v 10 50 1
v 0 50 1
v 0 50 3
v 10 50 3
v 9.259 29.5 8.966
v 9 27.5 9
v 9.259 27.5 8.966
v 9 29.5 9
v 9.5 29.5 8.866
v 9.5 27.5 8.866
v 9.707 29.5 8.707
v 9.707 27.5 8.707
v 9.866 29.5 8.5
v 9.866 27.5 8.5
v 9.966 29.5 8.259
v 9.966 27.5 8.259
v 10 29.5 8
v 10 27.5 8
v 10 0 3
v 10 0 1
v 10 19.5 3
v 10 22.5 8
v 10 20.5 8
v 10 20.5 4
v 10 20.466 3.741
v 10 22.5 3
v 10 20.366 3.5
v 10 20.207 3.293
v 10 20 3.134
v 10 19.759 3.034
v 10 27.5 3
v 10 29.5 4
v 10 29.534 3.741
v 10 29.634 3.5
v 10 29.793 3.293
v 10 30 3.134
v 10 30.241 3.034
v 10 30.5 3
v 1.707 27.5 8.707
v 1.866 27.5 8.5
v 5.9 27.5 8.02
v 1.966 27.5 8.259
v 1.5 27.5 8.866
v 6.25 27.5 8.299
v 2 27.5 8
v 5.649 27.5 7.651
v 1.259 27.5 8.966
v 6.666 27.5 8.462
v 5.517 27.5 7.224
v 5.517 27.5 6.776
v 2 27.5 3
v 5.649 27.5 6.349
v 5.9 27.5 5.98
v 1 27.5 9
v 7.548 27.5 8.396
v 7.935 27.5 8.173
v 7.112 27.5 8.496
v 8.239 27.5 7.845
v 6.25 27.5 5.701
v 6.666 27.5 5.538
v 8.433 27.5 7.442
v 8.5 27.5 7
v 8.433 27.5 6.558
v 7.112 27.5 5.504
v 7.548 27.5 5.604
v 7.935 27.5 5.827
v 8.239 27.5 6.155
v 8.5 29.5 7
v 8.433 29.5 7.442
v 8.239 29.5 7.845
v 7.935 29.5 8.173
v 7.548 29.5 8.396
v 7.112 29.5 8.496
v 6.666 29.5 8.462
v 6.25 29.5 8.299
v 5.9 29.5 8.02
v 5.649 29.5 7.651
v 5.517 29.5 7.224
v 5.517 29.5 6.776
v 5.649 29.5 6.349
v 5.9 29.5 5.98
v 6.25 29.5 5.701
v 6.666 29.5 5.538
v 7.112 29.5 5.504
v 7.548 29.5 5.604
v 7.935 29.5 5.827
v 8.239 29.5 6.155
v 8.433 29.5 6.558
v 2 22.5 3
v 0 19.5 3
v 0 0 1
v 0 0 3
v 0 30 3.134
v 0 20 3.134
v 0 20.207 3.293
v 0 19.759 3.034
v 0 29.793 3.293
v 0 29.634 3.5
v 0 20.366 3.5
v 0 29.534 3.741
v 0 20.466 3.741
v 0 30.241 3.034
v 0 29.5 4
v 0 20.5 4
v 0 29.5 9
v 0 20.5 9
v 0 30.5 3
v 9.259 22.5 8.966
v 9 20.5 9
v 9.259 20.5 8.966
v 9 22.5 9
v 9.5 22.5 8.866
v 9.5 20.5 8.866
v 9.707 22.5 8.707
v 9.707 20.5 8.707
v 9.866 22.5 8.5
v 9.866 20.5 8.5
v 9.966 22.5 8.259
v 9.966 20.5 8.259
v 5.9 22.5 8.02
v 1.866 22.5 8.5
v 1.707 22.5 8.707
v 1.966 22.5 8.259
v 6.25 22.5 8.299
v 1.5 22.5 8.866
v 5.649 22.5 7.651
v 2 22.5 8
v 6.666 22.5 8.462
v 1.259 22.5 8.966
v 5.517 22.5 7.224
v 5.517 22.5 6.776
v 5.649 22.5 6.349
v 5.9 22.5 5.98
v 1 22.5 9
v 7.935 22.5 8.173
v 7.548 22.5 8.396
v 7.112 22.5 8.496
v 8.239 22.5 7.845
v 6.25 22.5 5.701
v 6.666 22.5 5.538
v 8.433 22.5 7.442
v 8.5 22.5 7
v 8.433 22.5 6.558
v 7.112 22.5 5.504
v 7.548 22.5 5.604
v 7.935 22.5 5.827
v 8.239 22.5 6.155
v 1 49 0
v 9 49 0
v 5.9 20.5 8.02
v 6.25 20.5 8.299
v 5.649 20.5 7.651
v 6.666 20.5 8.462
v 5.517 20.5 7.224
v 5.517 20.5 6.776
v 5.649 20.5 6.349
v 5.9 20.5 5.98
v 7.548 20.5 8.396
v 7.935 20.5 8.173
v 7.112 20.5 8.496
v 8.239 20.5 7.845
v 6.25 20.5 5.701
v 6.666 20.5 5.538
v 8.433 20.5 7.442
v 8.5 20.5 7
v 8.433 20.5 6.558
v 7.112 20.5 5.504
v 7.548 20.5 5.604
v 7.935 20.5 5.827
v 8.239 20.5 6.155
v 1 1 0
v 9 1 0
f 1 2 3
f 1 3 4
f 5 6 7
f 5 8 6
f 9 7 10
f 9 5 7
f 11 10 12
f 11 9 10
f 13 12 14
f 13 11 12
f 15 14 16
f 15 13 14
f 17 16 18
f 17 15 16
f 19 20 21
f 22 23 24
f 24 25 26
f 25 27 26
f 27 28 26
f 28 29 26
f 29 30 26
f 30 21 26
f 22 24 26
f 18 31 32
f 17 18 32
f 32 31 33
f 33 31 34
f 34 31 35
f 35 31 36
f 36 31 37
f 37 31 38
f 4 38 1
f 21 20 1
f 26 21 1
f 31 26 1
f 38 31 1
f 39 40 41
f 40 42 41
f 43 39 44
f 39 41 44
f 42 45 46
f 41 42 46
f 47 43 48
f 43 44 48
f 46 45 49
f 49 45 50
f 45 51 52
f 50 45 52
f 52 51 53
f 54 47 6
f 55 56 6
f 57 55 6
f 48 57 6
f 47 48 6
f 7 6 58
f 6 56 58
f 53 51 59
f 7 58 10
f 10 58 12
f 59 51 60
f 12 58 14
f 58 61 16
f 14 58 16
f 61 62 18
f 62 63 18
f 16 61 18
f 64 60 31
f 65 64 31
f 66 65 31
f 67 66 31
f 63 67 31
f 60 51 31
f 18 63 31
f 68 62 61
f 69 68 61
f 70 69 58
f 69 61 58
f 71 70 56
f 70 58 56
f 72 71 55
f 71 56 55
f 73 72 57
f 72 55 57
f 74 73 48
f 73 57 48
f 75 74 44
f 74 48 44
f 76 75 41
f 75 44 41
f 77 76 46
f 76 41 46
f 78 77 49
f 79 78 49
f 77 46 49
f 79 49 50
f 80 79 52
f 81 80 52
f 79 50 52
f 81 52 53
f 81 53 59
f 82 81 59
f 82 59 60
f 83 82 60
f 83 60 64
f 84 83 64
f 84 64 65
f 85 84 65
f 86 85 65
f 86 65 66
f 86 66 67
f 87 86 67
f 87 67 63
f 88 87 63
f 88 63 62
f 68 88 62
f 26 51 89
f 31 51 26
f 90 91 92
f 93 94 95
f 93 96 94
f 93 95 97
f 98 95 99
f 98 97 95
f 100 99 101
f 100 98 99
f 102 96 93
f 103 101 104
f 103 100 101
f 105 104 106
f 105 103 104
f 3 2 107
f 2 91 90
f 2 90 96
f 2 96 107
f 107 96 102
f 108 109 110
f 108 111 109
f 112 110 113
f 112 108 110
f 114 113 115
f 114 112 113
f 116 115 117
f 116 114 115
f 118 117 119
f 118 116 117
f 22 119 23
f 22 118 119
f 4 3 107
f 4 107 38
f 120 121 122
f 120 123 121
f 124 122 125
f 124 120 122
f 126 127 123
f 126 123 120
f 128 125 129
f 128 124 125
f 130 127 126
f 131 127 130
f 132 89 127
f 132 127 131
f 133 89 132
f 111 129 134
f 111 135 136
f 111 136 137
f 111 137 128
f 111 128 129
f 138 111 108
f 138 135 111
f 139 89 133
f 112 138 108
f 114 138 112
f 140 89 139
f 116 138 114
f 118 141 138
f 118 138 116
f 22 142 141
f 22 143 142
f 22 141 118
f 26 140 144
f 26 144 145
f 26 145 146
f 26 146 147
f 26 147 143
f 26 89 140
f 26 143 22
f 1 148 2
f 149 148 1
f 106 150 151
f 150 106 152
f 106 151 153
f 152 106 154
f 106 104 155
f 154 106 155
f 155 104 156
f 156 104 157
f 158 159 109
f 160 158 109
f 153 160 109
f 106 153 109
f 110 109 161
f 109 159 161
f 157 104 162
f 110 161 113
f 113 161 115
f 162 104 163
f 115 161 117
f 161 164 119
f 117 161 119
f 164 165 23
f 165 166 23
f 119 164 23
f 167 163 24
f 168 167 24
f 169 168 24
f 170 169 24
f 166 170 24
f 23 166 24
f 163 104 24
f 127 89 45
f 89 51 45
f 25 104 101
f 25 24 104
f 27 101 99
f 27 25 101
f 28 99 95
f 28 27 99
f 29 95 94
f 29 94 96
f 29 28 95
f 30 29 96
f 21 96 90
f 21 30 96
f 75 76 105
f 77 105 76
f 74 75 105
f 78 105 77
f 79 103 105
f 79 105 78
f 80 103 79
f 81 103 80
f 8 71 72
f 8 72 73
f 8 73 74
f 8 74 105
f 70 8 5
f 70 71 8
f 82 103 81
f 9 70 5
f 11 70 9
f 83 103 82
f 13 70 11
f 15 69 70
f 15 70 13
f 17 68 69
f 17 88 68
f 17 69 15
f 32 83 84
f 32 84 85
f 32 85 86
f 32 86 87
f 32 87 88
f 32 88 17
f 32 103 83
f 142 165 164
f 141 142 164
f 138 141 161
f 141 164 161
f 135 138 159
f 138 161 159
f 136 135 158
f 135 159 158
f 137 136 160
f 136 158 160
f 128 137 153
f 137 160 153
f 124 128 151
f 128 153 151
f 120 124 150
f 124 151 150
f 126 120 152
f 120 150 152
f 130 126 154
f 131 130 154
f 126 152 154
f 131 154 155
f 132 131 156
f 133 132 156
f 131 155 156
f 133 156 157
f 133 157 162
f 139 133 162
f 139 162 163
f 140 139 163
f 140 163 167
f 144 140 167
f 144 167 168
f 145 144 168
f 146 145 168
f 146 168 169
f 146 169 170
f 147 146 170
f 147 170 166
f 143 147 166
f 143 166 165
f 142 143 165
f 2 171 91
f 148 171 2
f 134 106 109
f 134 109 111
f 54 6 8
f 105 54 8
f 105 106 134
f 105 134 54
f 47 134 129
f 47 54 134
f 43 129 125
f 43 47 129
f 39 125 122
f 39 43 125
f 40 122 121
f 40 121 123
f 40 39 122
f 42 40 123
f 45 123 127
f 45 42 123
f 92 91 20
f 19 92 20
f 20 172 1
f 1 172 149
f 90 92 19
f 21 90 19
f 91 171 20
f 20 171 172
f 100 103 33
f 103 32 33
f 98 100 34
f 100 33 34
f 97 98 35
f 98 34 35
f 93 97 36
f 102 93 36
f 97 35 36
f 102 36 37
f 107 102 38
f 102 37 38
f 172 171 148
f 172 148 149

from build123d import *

# Parameters (mm, degrees)
SKETCH1_W           = 10
SKETCH1_H           = 50
BOSS_EXTRUDE1_DEPTH = 3
CHAMFER1_SIZE       = 1
SKETCH2_W           = 10
SKETCH2_H           = 2
BOSS_EXTRUDE2_DEPTH = 6
SKETCH3_R           = 1.5
CUT_EXTRUDE1_DEPTH  = 10
FILLET1_R           = 1
FILLET2_R           = 1
SKETCH4_W           = 6
SKETCH4_H           = 5
BOSS_EXTRUDE3_DEPTH = 2
FILLET3_R           = 1


with BuildPart() as part:
    # Sketch1 → Boss-Extrude1 (new body)
    with BuildSketch(Plane.XY):
        with Locations((5, 25)):
            Rectangle(SKETCH1_W, SKETCH1_H)
    extrude(amount=BOSS_EXTRUDE1_DEPTH)

    # Chamfer1
    chamfer1_edges = [part.edges().sort_by_distance(p)[0] for p in [
        (5, 50, 0),
        (10, 25, 0),
        (5, 0, 0),
        (0, 25, 0),
    ]]
    chamfer(chamfer1_edges, length=CHAMFER1_SIZE)

    # Sketch2 → Boss-Extrude2 (add)
    with BuildSketch(Plane.XY.offset(3)):
        with Locations((5, 28.5)):
            Rectangle(SKETCH2_W, SKETCH2_H)
        with Locations((5, 21.5)):
            Rectangle(SKETCH2_W, SKETCH2_H)
    extrude(amount=BOSS_EXTRUDE2_DEPTH)

    # Sketch3 → Cut-Extrude1 (cut)
    with BuildSketch(Plane.XZ.offset(-20.5)):
        with Locations((7, 7)):
            Circle(SKETCH3_R)
    extrude(amount=-CUT_EXTRUDE1_DEPTH, mode=Mode.SUBTRACT)

    # Fillet1
    fillet1_edges = [part.edges().sort_by_distance(p)[0] for p in [
        (10, 28.5, 9),
        (10, 21.5, 9),
    ]]
    fillet(fillet1_edges, radius=FILLET1_R)

    # Fillet2
    fillet2_edges = [part.edges().sort_by_distance(p)[0] for p in [
        (5, 29.5, 3),
        (5, 20.5, 3),
    ]]
    fillet(fillet2_edges, radius=FILLET2_R)

    # Sketch4 → Boss-Extrude3 (add)
    with BuildSketch(Plane.ZY):
        with Locations((6, 25)):
            Rectangle(SKETCH4_W, SKETCH4_H)
    extrude(amount=-BOSS_EXTRUDE3_DEPTH)

    # Fillet3
    fillet3_edges = [part.edges().sort_by_distance(p)[0] for p in [
        (2, 25, 9),
    ]]
    fillet(fillet3_edges, radius=FILLET3_R)


solid = part.part
